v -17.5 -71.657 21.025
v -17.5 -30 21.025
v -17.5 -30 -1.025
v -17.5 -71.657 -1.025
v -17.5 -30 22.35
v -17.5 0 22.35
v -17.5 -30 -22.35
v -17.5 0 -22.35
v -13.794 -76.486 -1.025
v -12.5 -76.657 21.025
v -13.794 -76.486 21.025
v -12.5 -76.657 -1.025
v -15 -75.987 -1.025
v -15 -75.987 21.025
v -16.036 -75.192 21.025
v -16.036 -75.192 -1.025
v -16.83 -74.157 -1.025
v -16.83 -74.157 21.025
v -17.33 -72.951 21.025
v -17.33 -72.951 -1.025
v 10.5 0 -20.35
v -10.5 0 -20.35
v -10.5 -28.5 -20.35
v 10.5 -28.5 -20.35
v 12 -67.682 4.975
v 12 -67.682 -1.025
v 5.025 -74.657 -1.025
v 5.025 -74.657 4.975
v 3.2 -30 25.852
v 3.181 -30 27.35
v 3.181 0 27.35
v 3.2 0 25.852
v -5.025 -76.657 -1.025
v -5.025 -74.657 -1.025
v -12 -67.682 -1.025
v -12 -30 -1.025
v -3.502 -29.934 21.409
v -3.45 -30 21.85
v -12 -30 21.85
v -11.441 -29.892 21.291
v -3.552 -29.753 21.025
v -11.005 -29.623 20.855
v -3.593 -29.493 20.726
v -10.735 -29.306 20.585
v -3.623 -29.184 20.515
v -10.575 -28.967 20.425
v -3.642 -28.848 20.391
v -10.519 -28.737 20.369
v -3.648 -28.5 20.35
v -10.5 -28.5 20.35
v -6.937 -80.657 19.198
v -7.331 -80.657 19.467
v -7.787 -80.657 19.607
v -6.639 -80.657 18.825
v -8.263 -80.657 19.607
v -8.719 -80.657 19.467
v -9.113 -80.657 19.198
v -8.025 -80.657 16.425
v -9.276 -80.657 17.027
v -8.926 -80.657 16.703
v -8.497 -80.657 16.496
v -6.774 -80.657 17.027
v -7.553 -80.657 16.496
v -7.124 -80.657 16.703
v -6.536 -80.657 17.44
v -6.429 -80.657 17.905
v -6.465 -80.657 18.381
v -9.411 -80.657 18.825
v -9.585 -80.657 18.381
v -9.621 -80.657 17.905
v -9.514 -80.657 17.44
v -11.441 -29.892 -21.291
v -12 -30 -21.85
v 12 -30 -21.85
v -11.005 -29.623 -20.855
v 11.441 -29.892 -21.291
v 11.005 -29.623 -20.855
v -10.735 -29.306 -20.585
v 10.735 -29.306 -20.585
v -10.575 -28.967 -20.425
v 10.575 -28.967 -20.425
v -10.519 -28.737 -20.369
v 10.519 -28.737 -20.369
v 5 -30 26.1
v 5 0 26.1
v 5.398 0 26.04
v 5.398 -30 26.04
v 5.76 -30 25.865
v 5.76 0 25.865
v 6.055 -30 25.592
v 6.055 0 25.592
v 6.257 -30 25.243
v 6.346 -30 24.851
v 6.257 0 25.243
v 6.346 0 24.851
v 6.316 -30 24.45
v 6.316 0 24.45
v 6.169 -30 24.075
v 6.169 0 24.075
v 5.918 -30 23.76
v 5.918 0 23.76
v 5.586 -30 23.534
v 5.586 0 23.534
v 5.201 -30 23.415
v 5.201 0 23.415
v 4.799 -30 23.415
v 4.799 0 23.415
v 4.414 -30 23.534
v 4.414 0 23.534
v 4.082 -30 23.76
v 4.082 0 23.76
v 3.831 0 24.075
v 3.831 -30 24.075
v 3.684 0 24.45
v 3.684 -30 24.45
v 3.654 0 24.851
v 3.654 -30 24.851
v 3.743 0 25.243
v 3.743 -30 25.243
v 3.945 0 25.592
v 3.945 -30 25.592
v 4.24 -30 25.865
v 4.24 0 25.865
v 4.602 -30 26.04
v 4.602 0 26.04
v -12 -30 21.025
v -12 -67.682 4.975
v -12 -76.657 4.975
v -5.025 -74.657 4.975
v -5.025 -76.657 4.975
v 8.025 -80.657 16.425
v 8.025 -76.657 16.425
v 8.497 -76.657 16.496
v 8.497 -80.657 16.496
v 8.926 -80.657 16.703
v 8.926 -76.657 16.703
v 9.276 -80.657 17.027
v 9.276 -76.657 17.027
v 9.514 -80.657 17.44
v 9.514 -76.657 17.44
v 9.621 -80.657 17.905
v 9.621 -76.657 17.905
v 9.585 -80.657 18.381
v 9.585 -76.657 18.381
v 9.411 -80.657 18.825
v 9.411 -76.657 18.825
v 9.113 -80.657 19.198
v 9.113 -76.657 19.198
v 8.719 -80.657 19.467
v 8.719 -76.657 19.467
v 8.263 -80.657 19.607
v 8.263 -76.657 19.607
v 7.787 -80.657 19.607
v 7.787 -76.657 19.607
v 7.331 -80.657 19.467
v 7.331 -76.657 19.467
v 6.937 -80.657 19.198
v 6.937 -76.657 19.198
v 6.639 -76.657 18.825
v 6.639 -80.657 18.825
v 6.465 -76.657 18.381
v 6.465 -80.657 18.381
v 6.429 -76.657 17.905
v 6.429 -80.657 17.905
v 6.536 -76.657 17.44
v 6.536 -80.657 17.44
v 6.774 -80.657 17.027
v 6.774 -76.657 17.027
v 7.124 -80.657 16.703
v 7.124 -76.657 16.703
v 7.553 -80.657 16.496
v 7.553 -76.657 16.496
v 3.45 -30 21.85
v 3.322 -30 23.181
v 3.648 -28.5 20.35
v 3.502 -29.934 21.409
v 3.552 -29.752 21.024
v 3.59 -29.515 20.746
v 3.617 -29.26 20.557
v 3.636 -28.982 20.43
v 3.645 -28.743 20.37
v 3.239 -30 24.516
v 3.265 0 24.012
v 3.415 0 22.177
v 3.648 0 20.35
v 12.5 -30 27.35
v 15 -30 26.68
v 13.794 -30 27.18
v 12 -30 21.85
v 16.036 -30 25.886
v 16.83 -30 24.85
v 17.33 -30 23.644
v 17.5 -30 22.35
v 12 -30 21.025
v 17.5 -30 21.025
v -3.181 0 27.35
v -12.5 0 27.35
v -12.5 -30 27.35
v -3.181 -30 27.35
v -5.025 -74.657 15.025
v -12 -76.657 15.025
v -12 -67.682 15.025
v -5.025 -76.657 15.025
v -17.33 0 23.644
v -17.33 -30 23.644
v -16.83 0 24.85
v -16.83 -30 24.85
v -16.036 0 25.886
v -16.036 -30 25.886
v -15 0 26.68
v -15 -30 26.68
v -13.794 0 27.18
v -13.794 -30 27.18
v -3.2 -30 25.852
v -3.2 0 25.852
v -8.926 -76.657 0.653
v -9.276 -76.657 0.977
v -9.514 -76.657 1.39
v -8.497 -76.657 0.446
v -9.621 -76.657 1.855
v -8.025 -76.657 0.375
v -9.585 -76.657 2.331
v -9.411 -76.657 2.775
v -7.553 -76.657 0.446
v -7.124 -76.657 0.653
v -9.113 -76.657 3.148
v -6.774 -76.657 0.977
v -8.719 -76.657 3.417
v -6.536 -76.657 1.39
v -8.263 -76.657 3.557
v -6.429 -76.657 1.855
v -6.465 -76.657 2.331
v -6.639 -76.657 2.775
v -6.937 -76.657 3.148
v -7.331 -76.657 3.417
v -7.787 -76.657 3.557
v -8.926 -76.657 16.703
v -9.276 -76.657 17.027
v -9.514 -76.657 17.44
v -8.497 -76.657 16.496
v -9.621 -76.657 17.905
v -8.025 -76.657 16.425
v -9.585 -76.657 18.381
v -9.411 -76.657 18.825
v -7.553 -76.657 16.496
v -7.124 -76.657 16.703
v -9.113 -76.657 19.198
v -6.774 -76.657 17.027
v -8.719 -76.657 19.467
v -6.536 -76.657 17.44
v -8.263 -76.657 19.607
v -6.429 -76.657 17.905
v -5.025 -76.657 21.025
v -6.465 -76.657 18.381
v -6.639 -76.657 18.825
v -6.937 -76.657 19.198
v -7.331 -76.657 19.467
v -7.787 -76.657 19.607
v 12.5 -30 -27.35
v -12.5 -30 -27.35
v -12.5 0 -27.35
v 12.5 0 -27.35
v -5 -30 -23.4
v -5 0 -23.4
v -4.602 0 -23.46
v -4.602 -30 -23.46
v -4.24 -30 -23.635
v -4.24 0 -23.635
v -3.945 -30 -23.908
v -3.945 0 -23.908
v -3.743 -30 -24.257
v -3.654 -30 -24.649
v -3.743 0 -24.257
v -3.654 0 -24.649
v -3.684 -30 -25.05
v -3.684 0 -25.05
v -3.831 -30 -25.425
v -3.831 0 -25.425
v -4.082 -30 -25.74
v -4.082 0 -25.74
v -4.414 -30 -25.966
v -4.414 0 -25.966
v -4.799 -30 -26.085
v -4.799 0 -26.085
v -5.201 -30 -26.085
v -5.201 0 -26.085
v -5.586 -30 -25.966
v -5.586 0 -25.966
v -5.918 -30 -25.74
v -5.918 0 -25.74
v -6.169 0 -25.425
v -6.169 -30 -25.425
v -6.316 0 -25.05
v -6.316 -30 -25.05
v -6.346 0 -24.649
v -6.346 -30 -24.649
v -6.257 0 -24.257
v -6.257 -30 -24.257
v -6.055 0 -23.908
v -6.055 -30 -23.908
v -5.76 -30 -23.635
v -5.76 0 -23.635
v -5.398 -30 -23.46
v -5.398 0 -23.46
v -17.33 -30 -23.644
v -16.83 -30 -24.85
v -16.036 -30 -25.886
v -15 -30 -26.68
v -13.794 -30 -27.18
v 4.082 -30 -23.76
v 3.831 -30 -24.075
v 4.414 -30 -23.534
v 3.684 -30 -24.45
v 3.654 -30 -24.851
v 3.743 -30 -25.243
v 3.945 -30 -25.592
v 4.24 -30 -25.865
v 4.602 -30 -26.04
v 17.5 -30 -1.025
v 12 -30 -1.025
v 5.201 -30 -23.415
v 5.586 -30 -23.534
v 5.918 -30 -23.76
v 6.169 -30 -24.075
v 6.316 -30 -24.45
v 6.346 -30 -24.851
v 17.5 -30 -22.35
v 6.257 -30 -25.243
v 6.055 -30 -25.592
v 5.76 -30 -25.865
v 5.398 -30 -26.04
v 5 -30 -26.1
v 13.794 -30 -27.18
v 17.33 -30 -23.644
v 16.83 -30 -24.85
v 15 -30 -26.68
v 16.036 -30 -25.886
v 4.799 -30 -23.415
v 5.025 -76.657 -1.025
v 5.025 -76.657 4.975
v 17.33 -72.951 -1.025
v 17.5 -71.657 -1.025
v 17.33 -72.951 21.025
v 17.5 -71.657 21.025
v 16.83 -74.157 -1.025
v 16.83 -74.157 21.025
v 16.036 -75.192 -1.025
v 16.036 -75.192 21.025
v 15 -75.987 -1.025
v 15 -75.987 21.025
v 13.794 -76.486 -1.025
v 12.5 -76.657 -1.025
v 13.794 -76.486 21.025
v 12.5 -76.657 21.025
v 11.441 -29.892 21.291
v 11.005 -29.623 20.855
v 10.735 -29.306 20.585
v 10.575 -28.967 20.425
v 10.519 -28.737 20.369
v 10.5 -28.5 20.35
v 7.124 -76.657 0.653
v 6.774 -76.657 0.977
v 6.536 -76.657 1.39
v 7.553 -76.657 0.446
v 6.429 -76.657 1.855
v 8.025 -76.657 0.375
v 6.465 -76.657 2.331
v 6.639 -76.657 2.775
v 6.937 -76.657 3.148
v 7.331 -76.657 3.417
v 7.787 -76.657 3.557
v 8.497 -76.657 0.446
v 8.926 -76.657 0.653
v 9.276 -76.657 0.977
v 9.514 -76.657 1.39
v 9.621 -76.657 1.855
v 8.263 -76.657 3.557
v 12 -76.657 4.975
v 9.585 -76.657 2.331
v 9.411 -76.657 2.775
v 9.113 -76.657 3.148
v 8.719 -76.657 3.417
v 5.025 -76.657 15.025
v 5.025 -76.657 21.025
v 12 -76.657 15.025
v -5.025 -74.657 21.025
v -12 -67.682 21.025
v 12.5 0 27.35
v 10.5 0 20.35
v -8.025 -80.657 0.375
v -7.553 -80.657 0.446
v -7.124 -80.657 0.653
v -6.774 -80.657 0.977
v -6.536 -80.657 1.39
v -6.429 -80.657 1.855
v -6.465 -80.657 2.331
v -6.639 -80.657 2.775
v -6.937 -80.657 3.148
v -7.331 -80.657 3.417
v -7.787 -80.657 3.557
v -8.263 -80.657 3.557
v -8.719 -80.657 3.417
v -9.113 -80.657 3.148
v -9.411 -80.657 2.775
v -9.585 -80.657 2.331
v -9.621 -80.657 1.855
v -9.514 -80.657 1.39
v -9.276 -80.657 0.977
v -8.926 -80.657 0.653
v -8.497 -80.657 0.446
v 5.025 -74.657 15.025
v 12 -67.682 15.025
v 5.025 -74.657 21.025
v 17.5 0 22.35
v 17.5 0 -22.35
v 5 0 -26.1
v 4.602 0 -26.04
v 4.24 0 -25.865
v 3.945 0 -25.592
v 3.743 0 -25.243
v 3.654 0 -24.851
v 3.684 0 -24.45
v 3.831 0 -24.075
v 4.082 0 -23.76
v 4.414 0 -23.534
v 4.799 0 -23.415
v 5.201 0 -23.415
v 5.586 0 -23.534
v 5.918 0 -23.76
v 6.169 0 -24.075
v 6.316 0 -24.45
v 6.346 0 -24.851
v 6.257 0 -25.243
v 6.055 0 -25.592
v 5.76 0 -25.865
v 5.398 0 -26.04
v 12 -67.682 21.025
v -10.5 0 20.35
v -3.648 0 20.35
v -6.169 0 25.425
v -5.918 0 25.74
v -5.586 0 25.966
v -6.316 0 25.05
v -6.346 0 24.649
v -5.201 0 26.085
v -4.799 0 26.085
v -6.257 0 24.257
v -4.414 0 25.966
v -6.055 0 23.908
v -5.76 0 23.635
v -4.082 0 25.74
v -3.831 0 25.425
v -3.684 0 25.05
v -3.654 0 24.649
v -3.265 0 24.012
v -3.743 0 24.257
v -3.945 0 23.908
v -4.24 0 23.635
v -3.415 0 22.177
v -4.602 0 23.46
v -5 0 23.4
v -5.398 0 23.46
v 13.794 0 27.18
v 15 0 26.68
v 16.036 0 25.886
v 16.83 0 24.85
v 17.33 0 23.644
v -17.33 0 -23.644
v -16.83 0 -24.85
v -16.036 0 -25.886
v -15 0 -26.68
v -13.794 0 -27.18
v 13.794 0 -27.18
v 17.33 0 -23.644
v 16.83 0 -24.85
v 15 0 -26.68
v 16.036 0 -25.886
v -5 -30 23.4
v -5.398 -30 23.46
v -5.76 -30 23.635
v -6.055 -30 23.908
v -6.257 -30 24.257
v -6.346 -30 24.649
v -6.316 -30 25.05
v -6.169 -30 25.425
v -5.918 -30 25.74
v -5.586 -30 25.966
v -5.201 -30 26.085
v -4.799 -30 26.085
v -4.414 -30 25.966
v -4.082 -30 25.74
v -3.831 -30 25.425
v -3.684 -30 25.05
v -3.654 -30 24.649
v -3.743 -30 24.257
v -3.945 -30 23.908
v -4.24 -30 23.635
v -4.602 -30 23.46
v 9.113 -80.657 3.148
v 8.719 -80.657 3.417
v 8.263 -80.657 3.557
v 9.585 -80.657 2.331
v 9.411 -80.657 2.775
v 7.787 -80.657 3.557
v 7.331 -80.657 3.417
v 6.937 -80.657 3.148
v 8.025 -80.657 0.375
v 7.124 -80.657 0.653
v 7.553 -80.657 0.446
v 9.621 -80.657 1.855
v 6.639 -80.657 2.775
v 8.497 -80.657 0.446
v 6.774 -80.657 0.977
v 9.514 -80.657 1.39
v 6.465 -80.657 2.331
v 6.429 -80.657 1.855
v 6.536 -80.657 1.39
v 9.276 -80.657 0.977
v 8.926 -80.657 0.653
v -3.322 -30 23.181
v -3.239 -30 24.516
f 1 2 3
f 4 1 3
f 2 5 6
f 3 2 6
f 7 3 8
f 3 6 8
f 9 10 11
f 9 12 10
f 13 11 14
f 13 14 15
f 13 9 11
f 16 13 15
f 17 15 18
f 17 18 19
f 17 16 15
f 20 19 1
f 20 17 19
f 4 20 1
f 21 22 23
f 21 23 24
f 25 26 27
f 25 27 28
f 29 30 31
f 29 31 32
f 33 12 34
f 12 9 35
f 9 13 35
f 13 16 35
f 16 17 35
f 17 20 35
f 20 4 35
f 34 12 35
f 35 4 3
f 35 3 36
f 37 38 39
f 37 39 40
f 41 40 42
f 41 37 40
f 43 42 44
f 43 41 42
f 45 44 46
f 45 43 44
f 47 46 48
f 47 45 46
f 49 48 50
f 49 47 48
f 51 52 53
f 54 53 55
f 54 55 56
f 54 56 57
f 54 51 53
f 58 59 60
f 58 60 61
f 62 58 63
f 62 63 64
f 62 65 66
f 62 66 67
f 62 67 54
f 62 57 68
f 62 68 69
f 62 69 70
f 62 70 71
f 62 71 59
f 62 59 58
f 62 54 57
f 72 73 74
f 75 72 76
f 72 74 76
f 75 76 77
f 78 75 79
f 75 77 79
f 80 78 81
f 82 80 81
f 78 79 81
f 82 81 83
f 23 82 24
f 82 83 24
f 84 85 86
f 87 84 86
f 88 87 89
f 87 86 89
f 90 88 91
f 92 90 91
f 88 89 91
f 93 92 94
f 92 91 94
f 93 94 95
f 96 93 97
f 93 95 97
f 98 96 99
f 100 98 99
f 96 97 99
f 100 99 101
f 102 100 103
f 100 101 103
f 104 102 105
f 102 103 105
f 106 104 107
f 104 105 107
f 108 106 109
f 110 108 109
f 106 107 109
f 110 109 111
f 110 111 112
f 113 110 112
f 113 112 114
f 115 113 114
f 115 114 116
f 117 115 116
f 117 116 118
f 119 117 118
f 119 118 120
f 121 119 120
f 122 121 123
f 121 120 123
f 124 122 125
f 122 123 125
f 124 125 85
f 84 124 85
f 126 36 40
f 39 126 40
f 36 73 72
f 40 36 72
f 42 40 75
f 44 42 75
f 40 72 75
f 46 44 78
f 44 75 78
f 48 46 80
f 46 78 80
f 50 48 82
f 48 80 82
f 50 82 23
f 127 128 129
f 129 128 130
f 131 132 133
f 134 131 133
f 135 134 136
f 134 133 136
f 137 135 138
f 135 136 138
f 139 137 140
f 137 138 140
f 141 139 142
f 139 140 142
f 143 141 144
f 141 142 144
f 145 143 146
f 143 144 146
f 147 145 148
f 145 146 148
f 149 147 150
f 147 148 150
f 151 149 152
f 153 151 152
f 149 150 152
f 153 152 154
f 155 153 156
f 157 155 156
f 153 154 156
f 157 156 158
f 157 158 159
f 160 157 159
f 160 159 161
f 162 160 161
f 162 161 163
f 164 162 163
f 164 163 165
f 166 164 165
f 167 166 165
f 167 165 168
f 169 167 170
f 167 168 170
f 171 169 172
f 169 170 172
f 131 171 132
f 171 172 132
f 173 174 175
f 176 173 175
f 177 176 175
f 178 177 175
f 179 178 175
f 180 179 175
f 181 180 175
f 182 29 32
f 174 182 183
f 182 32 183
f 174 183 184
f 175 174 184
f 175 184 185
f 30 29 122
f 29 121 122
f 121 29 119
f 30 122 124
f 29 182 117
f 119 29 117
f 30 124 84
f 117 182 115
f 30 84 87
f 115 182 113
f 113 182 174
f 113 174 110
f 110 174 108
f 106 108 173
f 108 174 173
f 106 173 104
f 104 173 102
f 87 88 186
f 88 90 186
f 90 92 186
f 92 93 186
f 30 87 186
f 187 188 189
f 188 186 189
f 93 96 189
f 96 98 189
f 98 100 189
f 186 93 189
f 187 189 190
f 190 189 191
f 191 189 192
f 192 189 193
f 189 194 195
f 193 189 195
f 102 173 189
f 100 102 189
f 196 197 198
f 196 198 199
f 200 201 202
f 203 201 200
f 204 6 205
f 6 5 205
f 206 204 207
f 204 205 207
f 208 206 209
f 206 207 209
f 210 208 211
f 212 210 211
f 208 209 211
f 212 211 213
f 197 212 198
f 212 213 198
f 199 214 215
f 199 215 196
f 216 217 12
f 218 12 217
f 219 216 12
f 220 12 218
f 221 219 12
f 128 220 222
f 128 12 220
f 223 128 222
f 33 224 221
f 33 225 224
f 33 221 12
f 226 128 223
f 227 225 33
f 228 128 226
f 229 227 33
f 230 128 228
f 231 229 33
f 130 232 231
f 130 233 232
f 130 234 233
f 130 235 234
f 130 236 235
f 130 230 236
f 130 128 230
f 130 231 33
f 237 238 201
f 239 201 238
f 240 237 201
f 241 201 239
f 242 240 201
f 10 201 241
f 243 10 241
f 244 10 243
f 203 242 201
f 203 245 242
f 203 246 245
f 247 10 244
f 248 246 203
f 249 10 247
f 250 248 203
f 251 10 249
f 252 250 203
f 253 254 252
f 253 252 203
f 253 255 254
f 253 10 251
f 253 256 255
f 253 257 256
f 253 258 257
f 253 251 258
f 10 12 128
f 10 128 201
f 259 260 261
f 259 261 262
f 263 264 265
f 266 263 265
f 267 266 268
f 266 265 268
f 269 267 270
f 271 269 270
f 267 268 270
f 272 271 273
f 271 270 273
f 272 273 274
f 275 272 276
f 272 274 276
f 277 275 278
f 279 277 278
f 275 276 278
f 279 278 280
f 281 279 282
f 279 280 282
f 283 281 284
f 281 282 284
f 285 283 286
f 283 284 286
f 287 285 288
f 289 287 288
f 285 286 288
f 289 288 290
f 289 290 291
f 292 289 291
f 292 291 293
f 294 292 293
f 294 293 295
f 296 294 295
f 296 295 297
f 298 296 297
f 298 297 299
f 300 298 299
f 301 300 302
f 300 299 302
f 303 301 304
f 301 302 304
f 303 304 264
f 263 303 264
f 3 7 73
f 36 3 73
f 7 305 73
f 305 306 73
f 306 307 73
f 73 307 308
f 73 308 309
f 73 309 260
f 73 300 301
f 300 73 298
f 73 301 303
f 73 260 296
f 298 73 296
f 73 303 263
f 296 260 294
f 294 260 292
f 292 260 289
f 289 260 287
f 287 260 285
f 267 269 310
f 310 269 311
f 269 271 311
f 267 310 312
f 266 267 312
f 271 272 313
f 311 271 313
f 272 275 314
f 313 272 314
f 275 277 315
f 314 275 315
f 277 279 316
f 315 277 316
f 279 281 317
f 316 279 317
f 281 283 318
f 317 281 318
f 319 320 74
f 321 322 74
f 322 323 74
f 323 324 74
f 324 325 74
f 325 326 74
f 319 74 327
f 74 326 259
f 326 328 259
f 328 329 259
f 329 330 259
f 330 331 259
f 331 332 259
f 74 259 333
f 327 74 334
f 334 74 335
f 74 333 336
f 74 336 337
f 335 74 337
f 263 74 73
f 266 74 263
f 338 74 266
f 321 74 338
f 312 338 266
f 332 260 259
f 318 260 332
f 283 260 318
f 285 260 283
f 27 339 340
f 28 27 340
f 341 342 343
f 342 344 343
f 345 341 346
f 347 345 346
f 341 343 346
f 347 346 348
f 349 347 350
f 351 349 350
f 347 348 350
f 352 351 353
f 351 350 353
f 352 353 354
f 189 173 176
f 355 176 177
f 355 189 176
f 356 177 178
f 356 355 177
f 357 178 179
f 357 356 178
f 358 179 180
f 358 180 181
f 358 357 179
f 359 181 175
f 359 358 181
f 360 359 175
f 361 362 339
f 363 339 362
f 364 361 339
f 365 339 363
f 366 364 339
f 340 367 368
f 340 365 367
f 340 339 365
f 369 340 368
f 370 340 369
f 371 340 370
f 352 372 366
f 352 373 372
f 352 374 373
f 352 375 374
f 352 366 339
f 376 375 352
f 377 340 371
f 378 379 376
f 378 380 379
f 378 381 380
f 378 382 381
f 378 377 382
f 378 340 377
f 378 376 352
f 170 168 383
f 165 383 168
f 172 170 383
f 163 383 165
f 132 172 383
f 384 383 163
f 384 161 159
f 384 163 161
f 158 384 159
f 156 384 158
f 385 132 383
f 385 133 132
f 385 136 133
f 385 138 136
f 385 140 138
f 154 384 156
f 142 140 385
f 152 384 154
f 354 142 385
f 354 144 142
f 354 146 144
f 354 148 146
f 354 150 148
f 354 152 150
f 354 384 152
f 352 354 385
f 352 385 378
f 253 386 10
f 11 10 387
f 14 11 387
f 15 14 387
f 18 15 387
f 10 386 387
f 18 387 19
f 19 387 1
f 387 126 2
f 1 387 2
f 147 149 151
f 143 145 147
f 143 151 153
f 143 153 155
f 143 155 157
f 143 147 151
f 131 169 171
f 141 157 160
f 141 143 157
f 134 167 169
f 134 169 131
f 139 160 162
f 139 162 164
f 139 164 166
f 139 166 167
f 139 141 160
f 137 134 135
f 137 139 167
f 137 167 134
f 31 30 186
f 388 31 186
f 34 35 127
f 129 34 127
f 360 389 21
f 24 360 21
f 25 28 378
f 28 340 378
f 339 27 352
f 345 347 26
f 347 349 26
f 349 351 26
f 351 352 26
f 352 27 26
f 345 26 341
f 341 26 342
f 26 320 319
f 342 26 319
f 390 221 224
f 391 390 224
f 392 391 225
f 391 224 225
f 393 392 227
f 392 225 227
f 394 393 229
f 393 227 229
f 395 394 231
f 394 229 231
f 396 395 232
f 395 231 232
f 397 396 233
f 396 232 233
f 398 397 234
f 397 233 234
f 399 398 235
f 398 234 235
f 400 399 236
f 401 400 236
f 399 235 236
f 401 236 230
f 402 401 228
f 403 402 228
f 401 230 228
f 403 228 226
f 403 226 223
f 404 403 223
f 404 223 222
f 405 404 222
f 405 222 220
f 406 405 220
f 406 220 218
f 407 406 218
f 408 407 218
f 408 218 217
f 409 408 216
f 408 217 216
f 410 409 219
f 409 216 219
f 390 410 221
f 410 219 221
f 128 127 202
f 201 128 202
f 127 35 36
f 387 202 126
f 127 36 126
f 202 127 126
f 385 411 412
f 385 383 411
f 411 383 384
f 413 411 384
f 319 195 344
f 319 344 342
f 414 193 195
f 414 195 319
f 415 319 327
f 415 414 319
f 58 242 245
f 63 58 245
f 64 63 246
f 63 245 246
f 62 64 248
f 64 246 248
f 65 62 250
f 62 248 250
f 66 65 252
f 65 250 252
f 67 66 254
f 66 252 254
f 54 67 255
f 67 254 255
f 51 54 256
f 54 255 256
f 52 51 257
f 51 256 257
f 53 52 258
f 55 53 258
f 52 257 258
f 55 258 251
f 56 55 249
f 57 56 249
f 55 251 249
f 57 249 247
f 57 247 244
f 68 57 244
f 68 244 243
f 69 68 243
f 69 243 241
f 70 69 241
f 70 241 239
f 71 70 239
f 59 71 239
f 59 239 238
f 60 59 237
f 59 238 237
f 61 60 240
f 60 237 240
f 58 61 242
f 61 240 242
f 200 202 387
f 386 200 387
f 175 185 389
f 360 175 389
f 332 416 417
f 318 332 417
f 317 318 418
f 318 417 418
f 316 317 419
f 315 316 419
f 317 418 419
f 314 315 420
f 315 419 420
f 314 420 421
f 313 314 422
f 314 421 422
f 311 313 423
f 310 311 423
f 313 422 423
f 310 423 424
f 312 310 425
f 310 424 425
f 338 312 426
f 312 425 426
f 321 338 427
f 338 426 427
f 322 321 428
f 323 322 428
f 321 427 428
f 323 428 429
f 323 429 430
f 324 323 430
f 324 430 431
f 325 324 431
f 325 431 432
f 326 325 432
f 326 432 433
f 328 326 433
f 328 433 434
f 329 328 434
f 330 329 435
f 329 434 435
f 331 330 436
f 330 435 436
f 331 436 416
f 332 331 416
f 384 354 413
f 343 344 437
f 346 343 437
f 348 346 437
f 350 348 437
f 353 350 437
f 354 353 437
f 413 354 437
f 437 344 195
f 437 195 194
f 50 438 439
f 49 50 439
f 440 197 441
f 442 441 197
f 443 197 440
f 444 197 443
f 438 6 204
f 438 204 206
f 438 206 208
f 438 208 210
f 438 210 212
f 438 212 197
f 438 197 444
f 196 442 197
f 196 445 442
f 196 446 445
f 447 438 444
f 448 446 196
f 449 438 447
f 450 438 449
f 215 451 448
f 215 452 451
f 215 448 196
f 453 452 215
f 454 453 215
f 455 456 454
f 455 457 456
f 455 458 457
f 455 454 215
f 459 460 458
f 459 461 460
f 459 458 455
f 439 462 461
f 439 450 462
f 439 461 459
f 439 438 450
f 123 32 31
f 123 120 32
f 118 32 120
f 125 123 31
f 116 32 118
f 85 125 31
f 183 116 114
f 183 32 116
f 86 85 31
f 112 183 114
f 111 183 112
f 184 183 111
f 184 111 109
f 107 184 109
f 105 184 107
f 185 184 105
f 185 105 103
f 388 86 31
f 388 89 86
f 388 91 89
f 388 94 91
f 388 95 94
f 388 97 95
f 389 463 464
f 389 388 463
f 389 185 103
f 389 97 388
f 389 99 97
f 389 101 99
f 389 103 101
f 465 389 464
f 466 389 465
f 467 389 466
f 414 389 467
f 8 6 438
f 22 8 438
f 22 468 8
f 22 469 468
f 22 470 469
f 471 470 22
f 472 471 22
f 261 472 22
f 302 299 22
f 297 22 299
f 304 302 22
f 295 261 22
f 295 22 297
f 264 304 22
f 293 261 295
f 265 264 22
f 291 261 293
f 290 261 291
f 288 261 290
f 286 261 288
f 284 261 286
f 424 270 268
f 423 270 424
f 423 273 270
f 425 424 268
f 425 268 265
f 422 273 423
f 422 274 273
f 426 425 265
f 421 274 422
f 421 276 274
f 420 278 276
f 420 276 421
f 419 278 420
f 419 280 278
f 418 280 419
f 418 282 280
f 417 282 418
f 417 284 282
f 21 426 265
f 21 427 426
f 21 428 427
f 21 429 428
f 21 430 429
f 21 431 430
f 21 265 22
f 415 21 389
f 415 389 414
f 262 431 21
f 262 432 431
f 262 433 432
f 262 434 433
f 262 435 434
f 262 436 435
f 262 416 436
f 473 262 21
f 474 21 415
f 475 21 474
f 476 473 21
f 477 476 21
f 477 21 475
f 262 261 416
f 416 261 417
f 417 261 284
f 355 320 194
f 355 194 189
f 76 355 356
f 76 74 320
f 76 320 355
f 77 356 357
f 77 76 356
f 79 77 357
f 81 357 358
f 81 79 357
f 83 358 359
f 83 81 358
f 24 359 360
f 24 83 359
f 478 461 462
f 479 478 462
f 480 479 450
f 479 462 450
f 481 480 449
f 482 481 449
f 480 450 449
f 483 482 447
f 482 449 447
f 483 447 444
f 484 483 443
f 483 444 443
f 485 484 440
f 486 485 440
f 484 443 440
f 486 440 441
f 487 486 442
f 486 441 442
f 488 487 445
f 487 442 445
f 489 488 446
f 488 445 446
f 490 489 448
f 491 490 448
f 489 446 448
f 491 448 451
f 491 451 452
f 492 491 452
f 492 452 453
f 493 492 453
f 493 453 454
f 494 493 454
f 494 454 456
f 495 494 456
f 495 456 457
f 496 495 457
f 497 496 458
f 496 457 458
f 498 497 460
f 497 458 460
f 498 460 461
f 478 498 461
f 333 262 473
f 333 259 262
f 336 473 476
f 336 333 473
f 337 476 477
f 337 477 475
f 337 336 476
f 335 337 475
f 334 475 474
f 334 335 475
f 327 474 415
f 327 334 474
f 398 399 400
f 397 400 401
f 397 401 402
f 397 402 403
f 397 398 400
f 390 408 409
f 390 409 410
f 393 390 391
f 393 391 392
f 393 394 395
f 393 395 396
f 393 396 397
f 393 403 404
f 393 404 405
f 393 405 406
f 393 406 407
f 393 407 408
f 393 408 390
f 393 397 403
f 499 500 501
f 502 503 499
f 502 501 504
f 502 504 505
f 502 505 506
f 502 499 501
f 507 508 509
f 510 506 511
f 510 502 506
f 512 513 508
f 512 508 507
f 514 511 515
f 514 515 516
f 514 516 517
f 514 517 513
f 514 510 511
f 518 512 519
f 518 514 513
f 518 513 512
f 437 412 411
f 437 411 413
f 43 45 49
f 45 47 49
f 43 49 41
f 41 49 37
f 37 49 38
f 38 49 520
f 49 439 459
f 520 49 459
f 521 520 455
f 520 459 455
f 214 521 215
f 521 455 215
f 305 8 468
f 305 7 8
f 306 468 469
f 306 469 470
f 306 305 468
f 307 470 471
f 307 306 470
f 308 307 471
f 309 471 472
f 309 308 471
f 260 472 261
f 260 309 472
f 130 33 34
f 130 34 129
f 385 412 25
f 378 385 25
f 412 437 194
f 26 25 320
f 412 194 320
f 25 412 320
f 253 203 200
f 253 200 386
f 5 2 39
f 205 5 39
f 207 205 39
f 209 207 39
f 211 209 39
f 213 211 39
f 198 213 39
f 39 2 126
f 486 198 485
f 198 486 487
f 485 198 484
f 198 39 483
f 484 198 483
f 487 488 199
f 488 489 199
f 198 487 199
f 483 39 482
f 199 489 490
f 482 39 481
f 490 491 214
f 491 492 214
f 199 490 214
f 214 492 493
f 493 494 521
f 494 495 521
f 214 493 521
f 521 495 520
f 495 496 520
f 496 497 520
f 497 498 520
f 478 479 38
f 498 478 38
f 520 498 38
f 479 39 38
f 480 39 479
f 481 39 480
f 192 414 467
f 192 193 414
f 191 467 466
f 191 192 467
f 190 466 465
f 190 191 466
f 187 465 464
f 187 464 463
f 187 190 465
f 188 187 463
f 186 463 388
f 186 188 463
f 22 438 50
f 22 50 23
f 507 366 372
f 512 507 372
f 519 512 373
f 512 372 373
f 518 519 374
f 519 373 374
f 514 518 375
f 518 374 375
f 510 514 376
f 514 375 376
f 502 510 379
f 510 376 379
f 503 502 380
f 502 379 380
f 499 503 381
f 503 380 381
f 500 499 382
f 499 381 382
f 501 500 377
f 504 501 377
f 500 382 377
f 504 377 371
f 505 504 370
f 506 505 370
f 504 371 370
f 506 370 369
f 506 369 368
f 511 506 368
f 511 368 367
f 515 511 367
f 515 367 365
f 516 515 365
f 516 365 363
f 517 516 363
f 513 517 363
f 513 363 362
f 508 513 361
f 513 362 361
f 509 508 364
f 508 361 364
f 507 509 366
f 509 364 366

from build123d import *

# Parameters (mm, degrees)
SKETCH2_W           = 35
SKETCH2_H           = 54.7
SKETCH2_R           = 1.35
SKETCH2_W_2         = 21
SKETCH2_H_2         = 40.7
BOSS_EXTRUDE1_DEPTH = 30
CUT_EXTRUDE2_REACH  = 46.207
BORDES_SERVO_R      = 1.5
ALTURA_TORRES_DEPTH = 46.65665
BOSS_EXTRUDE3_START = 46.65665
SKETCH5_3_W         = 6.975
SKETCH5_3_H         = 6
BOSS_EXTRUDE3_DEPTH = 2
CHAMFER1_SIZE       = 6.975
BOSS_EXTRUDE4_START = 46.65665
SKETCH5_4_R         = 1.6
BOSS_EXTRUDE4_DEPTH = 4
BORDES_EXT_R        = 5


with BuildPart() as part:
    # Sketch2 → Boss-Extrude1 (new body)
    with BuildSketch(Plane(origin=(0, 0, 0), x_dir=(1, 0, 0), z_dir=(0, 1, 0))):
        Rectangle(SKETCH2_W, SKETCH2_H)
        with Locations(Location((-5, 24.75, 0), (0, 0, 270))):
            Circle(SKETCH2_R, mode=Mode.SUBTRACT)
        with Locations(Location((5, 24.75, 0), (0, 0, 90))):
            Circle(SKETCH2_R, mode=Mode.SUBTRACT)
        with Locations(Location((-5, -24.75, 0), (0, 0, 90))):
            Circle(SKETCH2_R, mode=Mode.SUBTRACT)
        with Locations(Location((5, -24.75, 0), (0, 0, 270))):
            Circle(SKETCH2_R, mode=Mode.SUBTRACT)
        Rectangle(SKETCH2_W_2, SKETCH2_H_2, mode=Mode.SUBTRACT)
    extrude(amount=-BOSS_EXTRUDE1_DEPTH)

    # Sketch4 → Cut-Extrude2 (cut, up to next)
    with BuildSketch(Plane(origin=(0, 0, 0), x_dir=(1, 0, 0), z_dir=(0, 1, 0)), mode=Mode.PRIVATE) as cut_extrude2_sk1:
        with BuildLine():
            Line((-3.199984377, -25.852499805), (-3.181265624, -27.35))
            Line((-3.181265624, -27.35), (3.181265624, -27.35))
            Line((3.181265624, -27.35), (3.199984377, -25.852499805))
            ThreePointArc((3.199984377, -25.852499805), (3.329330747, -23.093556632), (3.647756443, -20.35))
            Line((3.647756443, -20.35), (-3.647756443, -20.35))
            ThreePointArc((-3.647756443, -20.35), (-3.329330747, -23.093556632), (-3.199984377, -25.852499805))
        make_face()
    cut_extrude2_tool1 = extrude(cut_extrude2_sk1.sketch, amount=-CUT_EXTRUDE2_REACH, mode=Mode.PRIVATE) & part.part
    add(cut_extrude2_tool1.solids().sort_by_distance((0, 0, 23.771279))[0], mode=Mode.SUBTRACT)

    # Bordes_Servo
    bordes_servo_edges = [part.edges().sort_by_distance(p)[0] for p in [
        (10.5, -30, 0),
        (-7.073878222, -30, 20.35),
        (-10.5, -30, 0),
        (0, -30, -20.35),
        (7.073878222, -30, 20.35),
    ]]
    fillet(bordes_servo_edges, radius=BORDES_SERVO_R)

    # Sketch5 → Altura torres (add)
    with BuildSketch(Plane.XZ.offset(30)):
        Polygon((-12, 21.025), (-17.5, 21.025), (-17.5, -1.025), (-12, -1.025), (-12, 4.975), (-12, 15.025), align=None)
        Polygon((12, 4.975), (12, -1.025), (17.5, -1.025), (17.5, 21.025), (12, 21.025), (12, 15.025), align=None)
    extrude(amount=ALTURA_TORRES_DEPTH)

    # Sketch5<3> → Boss-Extrude3 (add)
    with BuildSketch(Plane.XZ.offset(30).offset(BOSS_EXTRUDE3_START)):
        with Locations((-8.5125, 18.025)):
            Rectangle(SKETCH5_3_W, SKETCH5_3_H)
        with Locations((-8.5125, 1.975)):
            Rectangle(SKETCH5_3_W, SKETCH5_3_H)
        with Locations((8.5125, 1.975)):
            Rectangle(SKETCH5_3_W, SKETCH5_3_H)
        with Locations((8.5125, 18.025)):
            Rectangle(SKETCH5_3_W, SKETCH5_3_H)
    extrude(amount=-BOSS_EXTRUDE3_DEPTH)

    # Chamfer1
    chamfer1_edges = [part.edges().sort_by_distance(p)[0] for p in [
        (12, -74.65665, 18.025),
        (12, -74.65665, 1.975),
        (-12, -74.65665, 18.025),
        (-12, -74.65665, 1.975),
    ]]
    chamfer(chamfer1_edges, length=CHAMFER1_SIZE - 0.0001)  # a hair under: the kernel refuses the full size

    # Sketch5<4> → Boss-Extrude4 (add)
    with BuildSketch(Plane.XZ.offset(30).offset(BOSS_EXTRUDE4_START)):
        with Locations(Location((8.025, 1.975, 0), (0, 0, 270))):
            Circle(SKETCH5_4_R)
        with Locations(Location((-8.025, 1.975, 0), (0, 0, 270))):
            Circle(SKETCH5_4_R)
        with Locations(Location((-8.025, 18.025, 0), (0, 0, 270))):
            Circle(SKETCH5_4_R)
        with Locations(Location((8.025, 18.025, 0), (0, 0, 270))):
            Circle(SKETCH5_4_R)
    extrude(amount=BOSS_EXTRUDE4_DEPTH)

    # Bordes_Ext
    bordes_ext_edges = [part.edges().sort_by_distance(p)[0] for p in [
        (17.5, -76.65665, 10),
        (17.5, -15, -27.35),
        (17.5, -15, 27.35),
        (-17.5, -15, 27.35),
        (-17.5, -15, -27.35),
        (-17.5, -76.65665, 10),
    ]]
    fillet(bordes_ext_edges, radius=BORDES_EXT_R)


solid = part.part
